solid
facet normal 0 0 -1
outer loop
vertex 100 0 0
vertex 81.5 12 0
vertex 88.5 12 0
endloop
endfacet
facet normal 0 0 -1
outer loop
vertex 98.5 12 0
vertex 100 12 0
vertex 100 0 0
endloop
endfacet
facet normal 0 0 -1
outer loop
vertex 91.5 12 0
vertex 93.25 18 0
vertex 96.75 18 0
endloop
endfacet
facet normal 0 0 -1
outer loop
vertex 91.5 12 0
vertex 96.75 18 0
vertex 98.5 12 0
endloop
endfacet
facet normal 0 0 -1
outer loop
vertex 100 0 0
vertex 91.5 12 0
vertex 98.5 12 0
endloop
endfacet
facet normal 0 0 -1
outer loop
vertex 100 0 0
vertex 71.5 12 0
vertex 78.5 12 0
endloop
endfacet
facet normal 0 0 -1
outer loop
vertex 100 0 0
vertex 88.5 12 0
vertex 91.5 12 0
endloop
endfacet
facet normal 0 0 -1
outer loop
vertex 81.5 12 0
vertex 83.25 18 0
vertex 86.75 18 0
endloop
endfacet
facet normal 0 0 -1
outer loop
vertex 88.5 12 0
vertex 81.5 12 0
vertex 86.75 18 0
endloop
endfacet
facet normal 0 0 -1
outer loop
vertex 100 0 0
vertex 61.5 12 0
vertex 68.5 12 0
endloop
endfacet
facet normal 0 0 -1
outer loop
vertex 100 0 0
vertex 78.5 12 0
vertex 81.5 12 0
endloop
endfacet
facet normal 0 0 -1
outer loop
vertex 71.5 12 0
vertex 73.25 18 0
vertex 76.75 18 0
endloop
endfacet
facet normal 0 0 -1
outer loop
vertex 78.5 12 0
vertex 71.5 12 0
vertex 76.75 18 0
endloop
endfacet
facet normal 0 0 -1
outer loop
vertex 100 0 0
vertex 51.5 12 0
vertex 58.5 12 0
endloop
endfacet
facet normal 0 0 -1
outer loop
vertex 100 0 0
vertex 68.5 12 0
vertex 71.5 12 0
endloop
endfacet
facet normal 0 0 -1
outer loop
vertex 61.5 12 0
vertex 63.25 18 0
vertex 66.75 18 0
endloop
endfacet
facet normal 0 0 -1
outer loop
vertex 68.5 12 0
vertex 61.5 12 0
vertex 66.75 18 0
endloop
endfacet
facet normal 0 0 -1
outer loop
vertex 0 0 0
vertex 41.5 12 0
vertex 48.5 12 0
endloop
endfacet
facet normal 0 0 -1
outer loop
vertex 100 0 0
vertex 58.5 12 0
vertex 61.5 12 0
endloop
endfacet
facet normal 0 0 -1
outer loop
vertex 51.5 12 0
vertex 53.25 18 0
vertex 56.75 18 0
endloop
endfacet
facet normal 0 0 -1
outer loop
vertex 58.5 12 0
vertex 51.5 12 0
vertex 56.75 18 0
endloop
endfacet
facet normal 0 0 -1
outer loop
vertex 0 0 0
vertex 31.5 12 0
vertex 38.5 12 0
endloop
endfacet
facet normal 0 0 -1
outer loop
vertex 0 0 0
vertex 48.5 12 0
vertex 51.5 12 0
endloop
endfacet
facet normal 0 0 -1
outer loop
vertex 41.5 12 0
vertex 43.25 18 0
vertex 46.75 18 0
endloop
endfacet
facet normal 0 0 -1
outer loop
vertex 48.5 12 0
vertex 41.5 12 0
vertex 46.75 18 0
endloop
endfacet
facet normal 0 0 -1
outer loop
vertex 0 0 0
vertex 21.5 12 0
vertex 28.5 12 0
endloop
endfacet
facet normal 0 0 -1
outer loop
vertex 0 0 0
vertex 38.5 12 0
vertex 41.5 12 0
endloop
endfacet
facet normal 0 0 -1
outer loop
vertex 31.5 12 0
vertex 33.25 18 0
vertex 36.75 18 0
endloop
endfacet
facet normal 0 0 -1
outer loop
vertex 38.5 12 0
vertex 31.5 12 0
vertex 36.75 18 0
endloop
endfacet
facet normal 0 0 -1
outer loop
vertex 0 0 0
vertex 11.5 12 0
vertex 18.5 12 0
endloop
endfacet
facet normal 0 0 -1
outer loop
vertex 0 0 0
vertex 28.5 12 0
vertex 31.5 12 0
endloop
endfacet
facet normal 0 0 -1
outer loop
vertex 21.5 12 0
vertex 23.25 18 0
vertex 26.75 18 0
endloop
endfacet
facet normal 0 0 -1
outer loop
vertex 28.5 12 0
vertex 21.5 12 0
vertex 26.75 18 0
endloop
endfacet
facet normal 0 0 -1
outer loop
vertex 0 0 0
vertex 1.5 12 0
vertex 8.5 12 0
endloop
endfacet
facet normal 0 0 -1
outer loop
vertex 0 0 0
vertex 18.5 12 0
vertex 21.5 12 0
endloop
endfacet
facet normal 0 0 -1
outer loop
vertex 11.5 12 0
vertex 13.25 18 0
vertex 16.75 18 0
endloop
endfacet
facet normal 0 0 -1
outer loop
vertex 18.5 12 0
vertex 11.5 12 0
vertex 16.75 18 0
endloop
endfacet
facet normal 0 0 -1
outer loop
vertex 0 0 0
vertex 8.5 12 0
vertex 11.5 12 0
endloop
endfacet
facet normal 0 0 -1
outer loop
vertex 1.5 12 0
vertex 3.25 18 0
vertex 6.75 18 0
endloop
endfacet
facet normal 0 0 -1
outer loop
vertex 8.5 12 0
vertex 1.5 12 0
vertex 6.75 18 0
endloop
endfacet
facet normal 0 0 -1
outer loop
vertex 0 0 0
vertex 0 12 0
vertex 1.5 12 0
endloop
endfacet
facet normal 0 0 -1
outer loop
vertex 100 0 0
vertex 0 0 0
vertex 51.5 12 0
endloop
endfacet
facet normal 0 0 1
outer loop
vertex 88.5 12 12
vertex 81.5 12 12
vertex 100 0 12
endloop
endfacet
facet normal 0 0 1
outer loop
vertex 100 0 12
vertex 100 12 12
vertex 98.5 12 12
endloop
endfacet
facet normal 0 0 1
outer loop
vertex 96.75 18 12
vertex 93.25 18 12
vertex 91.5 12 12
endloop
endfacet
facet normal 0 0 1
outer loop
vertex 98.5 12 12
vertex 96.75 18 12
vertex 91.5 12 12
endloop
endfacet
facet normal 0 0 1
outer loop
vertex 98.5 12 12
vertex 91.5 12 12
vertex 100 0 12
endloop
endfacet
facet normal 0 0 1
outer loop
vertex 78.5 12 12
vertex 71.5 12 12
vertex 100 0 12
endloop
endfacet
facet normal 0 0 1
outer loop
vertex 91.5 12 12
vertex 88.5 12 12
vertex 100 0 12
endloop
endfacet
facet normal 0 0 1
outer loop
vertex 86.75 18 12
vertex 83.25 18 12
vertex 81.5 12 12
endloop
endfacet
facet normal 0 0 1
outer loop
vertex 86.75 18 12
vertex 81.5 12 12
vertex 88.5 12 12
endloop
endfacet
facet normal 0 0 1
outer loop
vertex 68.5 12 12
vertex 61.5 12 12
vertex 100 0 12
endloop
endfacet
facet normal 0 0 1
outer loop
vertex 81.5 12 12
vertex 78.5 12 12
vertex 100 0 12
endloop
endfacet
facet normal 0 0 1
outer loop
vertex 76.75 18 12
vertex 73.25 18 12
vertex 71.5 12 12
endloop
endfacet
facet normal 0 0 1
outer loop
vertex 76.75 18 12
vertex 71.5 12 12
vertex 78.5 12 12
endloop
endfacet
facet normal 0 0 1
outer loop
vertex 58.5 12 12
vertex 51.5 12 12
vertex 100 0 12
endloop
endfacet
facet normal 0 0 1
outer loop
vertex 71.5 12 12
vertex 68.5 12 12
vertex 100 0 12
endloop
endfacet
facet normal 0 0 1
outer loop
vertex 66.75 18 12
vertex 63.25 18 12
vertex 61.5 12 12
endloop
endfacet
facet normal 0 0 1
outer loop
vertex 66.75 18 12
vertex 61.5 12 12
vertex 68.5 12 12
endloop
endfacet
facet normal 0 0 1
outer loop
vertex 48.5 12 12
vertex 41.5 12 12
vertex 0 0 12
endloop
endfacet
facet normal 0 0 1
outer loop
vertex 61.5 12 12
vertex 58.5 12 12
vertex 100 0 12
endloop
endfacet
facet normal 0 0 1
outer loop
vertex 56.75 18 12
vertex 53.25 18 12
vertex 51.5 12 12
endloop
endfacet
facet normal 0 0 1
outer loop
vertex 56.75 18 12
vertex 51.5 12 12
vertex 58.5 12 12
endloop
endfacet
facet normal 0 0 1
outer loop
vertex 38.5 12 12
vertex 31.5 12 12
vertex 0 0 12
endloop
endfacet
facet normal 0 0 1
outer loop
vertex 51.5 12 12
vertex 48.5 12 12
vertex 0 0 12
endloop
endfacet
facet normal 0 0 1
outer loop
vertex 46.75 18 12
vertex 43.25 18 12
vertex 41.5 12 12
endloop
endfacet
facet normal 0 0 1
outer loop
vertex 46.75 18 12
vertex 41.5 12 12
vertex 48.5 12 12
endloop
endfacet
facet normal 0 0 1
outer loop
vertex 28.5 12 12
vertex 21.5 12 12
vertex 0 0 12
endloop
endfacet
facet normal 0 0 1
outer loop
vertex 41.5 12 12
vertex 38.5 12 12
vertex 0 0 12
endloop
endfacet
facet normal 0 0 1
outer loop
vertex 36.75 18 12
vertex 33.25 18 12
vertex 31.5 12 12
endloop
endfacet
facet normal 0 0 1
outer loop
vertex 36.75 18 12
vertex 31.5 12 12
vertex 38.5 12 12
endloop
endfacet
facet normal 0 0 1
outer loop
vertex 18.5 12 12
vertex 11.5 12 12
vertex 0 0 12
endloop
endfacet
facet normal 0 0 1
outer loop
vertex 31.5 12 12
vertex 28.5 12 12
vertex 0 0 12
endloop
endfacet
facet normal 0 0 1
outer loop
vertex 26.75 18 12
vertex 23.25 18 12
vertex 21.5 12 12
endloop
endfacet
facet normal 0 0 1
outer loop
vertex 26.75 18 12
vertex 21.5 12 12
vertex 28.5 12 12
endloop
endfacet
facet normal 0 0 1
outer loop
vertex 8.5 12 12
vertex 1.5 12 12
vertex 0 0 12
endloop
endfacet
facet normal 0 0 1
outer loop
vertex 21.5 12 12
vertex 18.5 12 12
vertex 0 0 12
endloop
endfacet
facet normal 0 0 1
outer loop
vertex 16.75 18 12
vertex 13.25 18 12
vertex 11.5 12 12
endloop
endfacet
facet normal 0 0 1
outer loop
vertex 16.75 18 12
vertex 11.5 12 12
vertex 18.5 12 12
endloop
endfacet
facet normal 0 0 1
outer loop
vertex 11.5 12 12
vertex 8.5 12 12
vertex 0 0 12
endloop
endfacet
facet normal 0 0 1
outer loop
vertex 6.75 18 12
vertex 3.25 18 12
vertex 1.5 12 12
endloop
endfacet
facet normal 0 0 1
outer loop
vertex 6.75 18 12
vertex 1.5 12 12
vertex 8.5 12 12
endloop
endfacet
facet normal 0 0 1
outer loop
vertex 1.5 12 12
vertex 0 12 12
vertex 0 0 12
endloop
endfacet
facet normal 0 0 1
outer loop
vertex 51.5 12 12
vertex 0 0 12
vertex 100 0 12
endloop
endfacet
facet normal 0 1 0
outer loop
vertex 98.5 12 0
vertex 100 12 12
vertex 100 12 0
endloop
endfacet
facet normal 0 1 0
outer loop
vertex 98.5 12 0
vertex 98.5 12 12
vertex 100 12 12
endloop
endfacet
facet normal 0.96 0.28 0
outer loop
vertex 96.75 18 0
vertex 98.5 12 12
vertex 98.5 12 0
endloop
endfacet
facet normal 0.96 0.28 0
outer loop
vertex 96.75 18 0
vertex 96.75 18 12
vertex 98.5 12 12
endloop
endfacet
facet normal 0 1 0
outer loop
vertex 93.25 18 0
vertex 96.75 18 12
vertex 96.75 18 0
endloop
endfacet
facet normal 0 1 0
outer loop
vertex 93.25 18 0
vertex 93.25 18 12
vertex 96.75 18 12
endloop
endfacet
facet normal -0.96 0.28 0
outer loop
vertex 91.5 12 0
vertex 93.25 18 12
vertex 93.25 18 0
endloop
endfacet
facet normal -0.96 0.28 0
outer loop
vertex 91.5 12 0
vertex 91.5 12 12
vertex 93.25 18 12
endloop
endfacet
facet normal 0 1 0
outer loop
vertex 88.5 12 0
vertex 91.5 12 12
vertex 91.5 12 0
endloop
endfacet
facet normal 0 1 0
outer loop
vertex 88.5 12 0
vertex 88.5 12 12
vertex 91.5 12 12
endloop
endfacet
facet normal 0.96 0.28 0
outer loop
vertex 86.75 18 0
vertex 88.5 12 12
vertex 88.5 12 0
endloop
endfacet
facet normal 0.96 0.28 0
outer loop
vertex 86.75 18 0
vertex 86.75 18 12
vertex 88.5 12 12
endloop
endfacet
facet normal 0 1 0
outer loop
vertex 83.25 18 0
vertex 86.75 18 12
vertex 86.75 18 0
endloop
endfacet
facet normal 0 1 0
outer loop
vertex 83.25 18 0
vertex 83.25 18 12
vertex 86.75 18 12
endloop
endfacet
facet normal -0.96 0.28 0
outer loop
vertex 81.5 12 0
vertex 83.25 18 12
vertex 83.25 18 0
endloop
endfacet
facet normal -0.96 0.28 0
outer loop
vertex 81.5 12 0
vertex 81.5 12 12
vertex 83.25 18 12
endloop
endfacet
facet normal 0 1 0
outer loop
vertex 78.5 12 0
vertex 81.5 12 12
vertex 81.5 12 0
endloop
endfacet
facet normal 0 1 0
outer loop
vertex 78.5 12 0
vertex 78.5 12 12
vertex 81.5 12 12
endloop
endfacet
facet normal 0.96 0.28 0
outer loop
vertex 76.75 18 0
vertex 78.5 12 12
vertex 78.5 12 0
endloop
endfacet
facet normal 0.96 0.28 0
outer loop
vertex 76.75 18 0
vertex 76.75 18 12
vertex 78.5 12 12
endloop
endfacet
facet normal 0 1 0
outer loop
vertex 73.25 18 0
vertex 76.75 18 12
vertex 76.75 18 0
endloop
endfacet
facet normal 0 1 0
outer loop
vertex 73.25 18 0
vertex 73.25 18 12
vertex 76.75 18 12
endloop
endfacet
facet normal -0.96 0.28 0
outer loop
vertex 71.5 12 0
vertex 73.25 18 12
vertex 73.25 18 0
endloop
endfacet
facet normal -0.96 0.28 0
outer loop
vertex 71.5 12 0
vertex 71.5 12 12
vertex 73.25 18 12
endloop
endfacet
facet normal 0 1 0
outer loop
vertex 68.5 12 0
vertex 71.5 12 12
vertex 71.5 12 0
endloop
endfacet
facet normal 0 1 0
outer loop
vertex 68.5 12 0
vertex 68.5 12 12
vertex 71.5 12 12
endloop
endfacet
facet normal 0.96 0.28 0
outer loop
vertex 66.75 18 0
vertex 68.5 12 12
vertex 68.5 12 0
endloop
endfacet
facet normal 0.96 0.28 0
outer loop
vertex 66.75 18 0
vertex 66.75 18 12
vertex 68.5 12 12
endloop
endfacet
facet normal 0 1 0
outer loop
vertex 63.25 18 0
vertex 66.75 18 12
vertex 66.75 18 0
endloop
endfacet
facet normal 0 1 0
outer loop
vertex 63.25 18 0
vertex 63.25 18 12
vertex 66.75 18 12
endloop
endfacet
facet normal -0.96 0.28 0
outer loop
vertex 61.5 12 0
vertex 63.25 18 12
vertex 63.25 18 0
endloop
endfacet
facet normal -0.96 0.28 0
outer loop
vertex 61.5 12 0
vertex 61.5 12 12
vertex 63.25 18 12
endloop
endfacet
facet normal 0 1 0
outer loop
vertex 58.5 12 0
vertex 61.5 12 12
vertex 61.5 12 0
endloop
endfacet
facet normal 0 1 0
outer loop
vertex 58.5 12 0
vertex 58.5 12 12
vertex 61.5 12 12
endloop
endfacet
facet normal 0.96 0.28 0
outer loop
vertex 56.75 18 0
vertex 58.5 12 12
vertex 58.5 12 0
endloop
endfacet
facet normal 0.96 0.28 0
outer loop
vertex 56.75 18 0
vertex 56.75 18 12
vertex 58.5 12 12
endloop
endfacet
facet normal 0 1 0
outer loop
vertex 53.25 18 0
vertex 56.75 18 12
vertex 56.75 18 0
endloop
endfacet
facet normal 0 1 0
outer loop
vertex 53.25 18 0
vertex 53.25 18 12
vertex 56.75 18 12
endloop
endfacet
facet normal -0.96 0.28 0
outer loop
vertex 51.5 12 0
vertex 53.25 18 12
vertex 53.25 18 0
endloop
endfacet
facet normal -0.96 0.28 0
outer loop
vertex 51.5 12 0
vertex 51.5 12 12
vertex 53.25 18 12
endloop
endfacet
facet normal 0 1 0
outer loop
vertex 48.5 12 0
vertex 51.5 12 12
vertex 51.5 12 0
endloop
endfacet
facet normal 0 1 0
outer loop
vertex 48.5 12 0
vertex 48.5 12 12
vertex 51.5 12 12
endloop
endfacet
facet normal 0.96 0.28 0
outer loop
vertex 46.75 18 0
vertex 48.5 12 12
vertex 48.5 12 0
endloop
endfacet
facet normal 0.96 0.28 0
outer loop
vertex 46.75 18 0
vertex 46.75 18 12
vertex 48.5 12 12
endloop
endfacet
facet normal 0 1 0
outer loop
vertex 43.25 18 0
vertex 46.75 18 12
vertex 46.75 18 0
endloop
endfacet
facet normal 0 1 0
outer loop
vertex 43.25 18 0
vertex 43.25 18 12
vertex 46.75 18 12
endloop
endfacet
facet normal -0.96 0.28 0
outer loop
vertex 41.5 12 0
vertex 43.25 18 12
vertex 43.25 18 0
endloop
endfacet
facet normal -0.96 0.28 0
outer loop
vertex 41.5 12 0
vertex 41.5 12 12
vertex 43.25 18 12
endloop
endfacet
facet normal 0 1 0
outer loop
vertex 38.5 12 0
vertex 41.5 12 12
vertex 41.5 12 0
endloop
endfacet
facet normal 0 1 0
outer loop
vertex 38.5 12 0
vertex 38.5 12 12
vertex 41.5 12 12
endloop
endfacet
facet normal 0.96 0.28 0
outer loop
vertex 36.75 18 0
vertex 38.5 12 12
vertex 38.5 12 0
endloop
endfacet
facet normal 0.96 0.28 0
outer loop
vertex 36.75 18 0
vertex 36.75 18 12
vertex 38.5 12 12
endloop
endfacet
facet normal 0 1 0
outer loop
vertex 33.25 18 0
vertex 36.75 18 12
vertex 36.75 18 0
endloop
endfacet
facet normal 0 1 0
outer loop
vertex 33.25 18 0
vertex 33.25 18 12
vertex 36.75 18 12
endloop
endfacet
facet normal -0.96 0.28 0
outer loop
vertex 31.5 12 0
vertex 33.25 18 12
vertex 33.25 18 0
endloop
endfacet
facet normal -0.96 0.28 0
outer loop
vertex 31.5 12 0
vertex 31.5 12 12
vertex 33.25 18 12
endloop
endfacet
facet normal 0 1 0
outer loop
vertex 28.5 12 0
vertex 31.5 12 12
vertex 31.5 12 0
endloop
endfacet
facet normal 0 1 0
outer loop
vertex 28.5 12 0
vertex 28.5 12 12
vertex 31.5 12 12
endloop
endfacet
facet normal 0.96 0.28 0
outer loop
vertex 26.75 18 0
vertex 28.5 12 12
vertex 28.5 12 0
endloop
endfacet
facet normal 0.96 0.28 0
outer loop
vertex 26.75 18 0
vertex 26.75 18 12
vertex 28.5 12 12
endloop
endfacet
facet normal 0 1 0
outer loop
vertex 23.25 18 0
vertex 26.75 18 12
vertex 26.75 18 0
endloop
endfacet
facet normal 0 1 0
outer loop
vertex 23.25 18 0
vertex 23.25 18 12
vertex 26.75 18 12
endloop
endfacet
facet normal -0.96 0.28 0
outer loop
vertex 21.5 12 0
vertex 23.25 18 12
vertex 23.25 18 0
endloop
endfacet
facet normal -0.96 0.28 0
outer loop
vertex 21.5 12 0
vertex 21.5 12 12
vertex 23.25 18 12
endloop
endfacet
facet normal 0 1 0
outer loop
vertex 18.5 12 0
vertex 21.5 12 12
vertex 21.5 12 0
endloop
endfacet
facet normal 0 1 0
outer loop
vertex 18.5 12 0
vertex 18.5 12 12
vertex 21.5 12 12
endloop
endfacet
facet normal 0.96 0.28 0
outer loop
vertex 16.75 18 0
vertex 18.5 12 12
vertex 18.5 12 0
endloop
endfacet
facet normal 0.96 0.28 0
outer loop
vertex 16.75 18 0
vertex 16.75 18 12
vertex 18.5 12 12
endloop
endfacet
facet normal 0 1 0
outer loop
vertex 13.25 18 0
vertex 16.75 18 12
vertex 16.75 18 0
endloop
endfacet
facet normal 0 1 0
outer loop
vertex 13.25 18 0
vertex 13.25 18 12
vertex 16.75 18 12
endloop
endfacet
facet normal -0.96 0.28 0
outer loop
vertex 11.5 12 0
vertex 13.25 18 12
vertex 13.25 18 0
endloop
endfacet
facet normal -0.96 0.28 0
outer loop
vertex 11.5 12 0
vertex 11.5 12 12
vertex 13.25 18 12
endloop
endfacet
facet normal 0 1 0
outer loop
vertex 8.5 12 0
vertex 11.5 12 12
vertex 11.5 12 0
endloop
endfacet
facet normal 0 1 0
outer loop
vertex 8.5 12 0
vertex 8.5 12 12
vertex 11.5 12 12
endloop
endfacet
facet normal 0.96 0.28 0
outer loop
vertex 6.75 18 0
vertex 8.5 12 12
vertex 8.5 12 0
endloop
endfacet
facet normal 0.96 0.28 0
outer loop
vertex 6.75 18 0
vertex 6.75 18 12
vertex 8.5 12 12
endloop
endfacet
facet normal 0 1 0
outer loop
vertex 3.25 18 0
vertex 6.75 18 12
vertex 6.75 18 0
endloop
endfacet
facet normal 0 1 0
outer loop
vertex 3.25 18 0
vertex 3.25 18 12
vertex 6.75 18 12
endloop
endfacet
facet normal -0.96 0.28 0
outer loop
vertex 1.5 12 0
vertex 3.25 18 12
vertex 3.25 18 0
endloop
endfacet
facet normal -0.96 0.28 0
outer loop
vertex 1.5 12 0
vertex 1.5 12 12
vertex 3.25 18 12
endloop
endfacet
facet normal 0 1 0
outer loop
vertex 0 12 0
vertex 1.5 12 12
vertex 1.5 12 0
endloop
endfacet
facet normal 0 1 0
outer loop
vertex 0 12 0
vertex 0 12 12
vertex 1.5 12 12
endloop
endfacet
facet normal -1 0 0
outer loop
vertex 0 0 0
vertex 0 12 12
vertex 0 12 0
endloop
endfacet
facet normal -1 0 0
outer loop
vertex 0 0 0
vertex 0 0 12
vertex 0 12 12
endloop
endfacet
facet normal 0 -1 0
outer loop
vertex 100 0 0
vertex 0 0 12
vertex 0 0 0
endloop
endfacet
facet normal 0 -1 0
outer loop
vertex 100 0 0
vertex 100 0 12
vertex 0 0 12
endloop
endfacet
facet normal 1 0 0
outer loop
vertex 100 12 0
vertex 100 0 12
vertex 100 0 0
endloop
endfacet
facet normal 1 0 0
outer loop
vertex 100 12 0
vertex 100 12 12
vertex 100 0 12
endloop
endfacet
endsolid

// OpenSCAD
$fn = 32;

// ----------------------------------------------------------------------
// Gear rack: 10 teeth, pitch 10 mm
// ----------------------------------------------------------------------

// --- parameters (mm) ---
teeth = 10;               // number of teeth
pitch = 10;               // tooth pitch, X
root_w = 7;               // tooth width at the root
tip_w = 3.5;              // tooth width at the tip
base_h = 12;              // rack body height, Y
tooth_h = 6;              // tooth height above the body
plate_t = 12;             // rack width, Z (extrusion height)

rack_l = teeth * pitch;  // overall length
total_h = base_h + tooth_h;  // overall height

profile = [[0, 0], [100, 0], [100, 12], [98.5, 12], [96.75, 18], [93.25, 18], [91.5, 12], [88.5, 12], [86.75, 18], [83.25, 18], [81.5, 12], [78.5, 12], [76.75, 18], [73.25, 18], [71.5, 12], [68.5, 12], [66.75, 18], [63.25, 18], [61.5, 12], [58.5, 12], [56.75, 18], [53.25, 18], [51.5, 12], [48.5, 12], [46.75, 18], [43.25, 18], [41.5, 12], [38.5, 12], [36.75, 18], [33.25, 18], [31.5, 12], [28.5, 12], [26.75, 18], [23.25, 18], [21.5, 12], [18.5, 12], [16.75, 18], [13.25, 18], [11.5, 12], [8.5, 12], [6.75, 18], [3.25, 18], [1.5, 12], [0, 12]];  // primary outline, 44 points, counter clockwise

// --- the one profile operation ---
linear_extrude(height = plate_t) polygon(points = profile);
